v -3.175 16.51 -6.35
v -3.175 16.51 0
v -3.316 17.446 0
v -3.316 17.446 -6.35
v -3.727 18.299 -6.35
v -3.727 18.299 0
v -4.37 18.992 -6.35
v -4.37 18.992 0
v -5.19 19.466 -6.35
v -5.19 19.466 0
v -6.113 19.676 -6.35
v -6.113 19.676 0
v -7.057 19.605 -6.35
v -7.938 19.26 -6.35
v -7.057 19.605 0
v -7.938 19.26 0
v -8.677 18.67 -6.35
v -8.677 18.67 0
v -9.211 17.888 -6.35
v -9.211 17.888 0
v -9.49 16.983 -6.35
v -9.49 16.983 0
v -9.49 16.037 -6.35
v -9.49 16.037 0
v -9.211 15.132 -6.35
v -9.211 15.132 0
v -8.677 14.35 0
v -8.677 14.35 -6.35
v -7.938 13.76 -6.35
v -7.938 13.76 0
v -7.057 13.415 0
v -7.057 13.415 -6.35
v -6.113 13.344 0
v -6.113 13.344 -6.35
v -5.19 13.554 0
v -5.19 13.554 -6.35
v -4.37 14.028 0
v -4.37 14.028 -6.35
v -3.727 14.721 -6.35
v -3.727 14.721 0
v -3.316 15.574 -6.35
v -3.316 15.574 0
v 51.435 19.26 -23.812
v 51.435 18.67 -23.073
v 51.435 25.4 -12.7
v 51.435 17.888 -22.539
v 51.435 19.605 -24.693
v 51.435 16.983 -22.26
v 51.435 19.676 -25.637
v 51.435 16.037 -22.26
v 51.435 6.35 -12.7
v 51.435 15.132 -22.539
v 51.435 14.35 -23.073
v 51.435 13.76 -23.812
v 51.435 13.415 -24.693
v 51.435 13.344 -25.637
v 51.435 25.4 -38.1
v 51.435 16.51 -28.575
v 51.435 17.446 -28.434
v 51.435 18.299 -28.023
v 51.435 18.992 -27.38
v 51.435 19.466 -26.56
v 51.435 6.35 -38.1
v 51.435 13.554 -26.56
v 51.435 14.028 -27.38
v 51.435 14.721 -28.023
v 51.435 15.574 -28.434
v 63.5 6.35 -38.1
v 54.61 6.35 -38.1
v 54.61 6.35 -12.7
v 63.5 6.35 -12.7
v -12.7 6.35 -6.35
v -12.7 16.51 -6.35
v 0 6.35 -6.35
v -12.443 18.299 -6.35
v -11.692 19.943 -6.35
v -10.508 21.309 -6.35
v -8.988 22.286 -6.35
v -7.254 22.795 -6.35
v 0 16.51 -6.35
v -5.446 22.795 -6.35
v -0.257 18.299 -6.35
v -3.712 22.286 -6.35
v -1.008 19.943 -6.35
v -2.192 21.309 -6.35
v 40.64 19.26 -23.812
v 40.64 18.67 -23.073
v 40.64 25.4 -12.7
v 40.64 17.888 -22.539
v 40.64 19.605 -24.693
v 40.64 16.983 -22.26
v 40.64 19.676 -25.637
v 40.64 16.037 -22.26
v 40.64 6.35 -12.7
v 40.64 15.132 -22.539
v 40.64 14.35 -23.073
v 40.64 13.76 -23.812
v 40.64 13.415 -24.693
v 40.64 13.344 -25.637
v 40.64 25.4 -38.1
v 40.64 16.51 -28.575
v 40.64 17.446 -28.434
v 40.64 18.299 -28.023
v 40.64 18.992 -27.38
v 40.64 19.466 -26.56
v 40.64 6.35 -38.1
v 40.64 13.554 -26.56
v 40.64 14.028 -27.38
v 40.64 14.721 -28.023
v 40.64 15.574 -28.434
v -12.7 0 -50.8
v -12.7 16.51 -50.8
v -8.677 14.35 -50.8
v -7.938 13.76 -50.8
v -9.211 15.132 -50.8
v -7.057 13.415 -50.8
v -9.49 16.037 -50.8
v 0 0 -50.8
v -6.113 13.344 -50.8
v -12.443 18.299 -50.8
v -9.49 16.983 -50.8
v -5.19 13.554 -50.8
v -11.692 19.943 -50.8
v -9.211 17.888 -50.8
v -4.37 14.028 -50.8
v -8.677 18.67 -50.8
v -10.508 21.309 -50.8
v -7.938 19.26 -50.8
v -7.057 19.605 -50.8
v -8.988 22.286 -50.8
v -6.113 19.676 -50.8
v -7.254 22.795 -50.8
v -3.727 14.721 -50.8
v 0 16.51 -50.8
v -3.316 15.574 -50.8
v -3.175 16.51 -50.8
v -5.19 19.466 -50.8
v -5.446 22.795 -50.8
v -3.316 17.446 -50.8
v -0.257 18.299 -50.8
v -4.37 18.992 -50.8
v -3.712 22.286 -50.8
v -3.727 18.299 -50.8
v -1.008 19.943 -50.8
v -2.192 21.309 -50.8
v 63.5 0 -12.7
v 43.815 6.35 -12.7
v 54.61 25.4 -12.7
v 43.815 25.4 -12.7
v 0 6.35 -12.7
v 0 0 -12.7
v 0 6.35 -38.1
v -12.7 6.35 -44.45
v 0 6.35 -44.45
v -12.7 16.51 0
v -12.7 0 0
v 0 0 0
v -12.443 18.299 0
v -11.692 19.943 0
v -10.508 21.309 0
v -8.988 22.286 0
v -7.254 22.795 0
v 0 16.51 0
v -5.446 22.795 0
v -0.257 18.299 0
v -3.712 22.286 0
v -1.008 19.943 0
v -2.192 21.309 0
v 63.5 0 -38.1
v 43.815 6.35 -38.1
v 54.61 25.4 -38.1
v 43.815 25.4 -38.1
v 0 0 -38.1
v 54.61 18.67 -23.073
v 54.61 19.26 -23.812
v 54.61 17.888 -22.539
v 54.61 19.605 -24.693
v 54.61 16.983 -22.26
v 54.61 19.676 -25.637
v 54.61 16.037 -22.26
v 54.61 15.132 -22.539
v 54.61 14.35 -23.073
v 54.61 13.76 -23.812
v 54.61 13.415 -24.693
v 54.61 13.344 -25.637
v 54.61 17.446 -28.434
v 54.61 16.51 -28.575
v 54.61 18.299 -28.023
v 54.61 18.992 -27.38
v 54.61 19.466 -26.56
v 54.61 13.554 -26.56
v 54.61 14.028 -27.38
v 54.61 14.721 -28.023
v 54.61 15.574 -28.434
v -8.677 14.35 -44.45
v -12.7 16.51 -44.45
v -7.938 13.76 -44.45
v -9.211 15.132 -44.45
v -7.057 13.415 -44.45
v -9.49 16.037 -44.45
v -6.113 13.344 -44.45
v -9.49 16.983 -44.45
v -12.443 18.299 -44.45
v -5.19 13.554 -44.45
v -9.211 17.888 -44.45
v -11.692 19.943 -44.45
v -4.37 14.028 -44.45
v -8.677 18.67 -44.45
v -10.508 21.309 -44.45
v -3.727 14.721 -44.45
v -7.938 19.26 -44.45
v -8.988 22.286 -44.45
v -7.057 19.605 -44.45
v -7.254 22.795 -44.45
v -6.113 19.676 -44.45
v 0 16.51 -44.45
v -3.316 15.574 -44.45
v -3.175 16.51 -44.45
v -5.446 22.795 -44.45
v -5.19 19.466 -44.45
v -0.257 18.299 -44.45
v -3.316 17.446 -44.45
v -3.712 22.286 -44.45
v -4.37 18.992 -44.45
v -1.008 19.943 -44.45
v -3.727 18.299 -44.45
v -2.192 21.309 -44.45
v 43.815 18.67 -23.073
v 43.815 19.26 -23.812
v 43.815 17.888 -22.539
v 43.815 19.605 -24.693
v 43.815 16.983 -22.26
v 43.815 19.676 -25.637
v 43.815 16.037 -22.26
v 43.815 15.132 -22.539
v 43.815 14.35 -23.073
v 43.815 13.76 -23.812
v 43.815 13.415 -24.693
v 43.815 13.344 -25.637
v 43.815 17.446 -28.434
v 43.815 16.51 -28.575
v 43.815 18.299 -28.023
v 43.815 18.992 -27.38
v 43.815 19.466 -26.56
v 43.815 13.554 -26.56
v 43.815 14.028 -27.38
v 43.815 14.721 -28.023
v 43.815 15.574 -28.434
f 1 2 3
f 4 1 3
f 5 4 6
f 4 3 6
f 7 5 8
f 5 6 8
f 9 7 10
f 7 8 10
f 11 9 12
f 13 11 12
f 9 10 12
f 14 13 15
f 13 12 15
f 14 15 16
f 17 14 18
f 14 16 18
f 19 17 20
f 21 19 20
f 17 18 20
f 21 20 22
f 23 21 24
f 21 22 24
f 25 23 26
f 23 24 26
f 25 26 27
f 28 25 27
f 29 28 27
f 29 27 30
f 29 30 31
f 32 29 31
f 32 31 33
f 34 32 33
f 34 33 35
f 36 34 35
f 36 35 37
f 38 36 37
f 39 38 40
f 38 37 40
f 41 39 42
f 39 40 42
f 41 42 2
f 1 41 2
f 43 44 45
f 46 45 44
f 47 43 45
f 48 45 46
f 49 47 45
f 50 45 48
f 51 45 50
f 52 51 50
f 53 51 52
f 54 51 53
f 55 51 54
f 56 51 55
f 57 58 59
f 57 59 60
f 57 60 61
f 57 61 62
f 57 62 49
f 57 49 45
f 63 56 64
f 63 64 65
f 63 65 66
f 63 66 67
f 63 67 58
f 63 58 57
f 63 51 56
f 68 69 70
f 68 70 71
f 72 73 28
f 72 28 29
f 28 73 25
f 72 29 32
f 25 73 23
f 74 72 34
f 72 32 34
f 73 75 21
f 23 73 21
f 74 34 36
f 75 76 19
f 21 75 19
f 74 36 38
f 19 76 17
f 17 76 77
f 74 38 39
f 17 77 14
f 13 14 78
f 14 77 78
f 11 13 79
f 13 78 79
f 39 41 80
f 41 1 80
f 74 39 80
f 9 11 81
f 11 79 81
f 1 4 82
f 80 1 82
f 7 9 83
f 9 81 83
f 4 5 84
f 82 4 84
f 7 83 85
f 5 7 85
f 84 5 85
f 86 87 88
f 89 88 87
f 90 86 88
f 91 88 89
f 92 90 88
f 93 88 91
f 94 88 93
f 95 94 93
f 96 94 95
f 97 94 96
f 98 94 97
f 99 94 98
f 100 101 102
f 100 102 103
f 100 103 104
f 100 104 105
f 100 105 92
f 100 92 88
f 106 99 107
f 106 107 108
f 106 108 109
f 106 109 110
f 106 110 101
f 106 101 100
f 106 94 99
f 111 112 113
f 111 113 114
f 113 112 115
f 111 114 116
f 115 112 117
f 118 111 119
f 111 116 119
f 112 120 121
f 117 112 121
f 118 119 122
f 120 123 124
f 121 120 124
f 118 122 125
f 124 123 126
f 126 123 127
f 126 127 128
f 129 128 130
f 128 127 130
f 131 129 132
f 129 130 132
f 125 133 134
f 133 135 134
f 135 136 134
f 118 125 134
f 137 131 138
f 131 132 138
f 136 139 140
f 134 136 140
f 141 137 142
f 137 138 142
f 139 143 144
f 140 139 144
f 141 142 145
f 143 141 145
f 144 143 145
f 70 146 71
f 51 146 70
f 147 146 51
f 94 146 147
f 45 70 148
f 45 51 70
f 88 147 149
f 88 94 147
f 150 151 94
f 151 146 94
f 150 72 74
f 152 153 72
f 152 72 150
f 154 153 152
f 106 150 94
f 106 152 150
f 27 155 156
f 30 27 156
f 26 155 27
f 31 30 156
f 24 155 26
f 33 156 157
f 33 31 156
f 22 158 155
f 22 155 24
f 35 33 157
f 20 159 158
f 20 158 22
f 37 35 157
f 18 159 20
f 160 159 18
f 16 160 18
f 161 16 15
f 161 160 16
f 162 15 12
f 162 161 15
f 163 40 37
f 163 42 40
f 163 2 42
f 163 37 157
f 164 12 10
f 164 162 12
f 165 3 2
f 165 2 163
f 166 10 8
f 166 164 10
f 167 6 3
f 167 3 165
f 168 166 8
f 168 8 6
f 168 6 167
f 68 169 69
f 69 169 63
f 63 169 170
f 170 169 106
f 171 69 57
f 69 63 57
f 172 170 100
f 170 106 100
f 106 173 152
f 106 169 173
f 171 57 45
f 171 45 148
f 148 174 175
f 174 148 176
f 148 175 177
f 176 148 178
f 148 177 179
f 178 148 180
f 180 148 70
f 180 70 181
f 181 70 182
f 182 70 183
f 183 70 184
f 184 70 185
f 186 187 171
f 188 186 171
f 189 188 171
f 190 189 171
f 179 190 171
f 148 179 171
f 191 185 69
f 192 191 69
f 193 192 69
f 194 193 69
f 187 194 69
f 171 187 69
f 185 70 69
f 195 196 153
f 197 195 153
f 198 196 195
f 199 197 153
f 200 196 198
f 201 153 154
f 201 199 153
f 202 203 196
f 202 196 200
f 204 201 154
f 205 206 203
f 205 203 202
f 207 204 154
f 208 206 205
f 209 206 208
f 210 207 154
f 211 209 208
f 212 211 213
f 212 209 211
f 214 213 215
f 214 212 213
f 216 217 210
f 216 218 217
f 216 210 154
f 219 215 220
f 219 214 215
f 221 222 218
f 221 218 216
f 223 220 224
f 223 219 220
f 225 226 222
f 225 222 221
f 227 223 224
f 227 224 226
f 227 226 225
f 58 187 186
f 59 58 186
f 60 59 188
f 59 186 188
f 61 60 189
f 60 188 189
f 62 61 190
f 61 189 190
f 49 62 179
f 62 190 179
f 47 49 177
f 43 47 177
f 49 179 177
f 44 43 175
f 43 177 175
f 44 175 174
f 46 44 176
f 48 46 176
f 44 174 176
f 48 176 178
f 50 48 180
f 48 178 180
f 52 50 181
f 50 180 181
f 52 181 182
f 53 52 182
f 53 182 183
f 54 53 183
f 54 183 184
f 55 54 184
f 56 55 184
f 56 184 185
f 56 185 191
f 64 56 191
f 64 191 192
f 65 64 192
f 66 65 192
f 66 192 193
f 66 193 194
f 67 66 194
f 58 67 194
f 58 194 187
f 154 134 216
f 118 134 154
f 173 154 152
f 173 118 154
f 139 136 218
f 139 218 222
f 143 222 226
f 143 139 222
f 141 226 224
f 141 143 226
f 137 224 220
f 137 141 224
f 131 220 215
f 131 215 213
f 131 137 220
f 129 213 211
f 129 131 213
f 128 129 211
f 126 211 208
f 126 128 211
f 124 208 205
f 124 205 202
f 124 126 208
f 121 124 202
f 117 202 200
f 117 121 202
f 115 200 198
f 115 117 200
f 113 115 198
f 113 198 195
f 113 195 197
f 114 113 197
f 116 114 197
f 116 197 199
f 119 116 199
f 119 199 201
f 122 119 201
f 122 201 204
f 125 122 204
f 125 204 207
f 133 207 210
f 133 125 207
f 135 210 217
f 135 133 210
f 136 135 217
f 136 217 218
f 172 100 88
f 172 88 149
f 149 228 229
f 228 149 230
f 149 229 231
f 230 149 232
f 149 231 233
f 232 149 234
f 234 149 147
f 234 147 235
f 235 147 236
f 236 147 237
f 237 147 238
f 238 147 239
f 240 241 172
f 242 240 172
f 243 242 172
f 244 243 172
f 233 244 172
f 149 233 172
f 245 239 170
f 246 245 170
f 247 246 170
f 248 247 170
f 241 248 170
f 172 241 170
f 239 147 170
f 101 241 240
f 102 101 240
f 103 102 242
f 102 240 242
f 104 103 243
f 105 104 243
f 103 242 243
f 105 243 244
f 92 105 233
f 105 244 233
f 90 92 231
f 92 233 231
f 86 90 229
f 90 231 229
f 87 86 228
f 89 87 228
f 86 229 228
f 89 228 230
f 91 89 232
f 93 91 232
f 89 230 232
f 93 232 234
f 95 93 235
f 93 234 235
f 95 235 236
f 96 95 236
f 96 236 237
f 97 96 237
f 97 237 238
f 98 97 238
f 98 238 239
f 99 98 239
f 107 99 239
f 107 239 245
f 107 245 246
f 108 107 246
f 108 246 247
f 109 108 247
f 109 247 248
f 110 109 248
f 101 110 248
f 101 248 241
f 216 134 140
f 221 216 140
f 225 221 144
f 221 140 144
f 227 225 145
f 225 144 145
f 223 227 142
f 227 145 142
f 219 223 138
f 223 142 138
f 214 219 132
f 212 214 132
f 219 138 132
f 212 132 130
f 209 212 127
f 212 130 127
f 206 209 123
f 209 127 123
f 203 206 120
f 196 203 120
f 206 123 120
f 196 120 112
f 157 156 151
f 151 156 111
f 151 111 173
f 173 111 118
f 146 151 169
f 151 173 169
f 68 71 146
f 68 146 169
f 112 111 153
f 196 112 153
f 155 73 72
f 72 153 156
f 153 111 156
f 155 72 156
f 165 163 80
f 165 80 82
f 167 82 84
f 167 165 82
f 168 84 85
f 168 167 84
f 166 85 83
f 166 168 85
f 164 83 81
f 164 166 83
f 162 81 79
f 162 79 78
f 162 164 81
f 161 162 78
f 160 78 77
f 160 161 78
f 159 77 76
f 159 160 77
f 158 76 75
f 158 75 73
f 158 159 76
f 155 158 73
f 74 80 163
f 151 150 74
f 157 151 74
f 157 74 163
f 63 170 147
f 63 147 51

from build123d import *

# Parameters (mm, degrees)
SKETCH1_W                         = 12.7
SKETCH1_H                         = 50.8
BASE_EXTRUDE_DEPTH                = 6.35
SKETCH6_W                         = 12.7
SKETCH6_H                         = 6.35
ARCH_BASE_EXTRUDE_DEPTH           = 10.16
ARCH_EXTRUDE_DEPTH                = 6.35
SKETCH3_R                         = 3.175
ARCH_HOLE_CUT_DEPTH               = 6.35
SKETCH4_W                         = 25.4
SKETCH4_H                         = 6.35
TAB_EXTRUDE_DEPTH                 = 63.5
SKETCH5_W                         = 3.175
SKETCH5_H                         = 25.4
SQUARE_SLIDE_GUIDES_EXTRUDE_DEPTH = 19.05
SKETCH14_R                        = 3.175
CUT_EXTRUDE3_DEPTH                = 13.97


with BuildPart() as part:
    # Sketch1 → Base Extrude (new body)
    with BuildSketch(Plane(origin=(0, 0, 0), x_dir=(1, 0, 0), z_dir=(0, 1, 0))):
        with Locations((-6.35, 25.4)):
            Rectangle(SKETCH1_W, SKETCH1_H)
    extrude(amount=BASE_EXTRUDE_DEPTH)

    # Sketch6 → Arch Base Extrude (add)
    with BuildSketch(Plane(origin=(0, 6.35, 0), x_dir=(1, 0, 0), z_dir=(0, 1, 0))):
        with Locations((-6.35, 3.175)):
            Rectangle(SKETCH6_W, SKETCH6_H)
    arch_base_extrude = extrude(amount=ARCH_BASE_EXTRUDE_DEPTH)

    # Mirror Arch Base: Arch Base Extrude across plane
    add(arch_base_extrude.mirror(Plane.XY.offset(-25.4)))

    # Sketch2 → Arch Extrude (add)
    with BuildSketch(Plane.XY):
        with BuildLine():
            Line((-12.7, 16.51), (0, 16.51))
            ThreePointArc((0, 16.51), (-6.35, 22.86), (-12.7, 16.51))
        make_face()
    arch_extrude = extrude(amount=-ARCH_EXTRUDE_DEPTH)

    # Sketch3 → Arch Hole Cut (cut)
    with BuildSketch(Plane.XY):
        with Locations((-6.35, 16.51)):
            Circle(SKETCH3_R)
    arch_hole_cut = extrude(amount=-ARCH_HOLE_CUT_DEPTH, mode=Mode.SUBTRACT)

    # Mirror Arch and Hole: Arch Extrude, Arch Hole Cut across plane
    add(arch_extrude.mirror(Plane.XY.offset(-25.4)))
    add(arch_hole_cut.mirror(Plane.XY.offset(-25.4)), mode=Mode.SUBTRACT)

    # Sketch4 → Tab Extrude (add)
    with BuildSketch(Plane(origin=(0, 0, 0), x_dir=(0, 0, -1), z_dir=(1, 0, 0))):
        with Locations((25.4, 3.175)):
            Rectangle(SKETCH4_W, SKETCH4_H)
    extrude(amount=TAB_EXTRUDE_DEPTH)

    # Sketch5 → Square Slide Guides Extrude (add)
    with BuildSketch(Plane(origin=(0, 6.35, 0), x_dir=(1, 0, 0), z_dir=(0, 1, 0))):
        with Locations((42.2275, 25.4)):
            Rectangle(SKETCH5_W, SKETCH5_H)
        with Locations((53.0225, 25.4)):
            Rectangle(SKETCH5_W, SKETCH5_H)
    extrude(amount=SQUARE_SLIDE_GUIDES_EXTRUDE_DEPTH)

    # Sketch14 → Cut-Extrude3 (cut)
    with BuildSketch(Plane(origin=(54.61, 0, 0), x_dir=(0, 0, -1), z_dir=(1, 0, 0))):
        with Locations((25.4, 16.51)):
            Circle(SKETCH14_R)
    extrude(amount=-CUT_EXTRUDE3_DEPTH, mode=Mode.SUBTRACT)


solid = part.part
